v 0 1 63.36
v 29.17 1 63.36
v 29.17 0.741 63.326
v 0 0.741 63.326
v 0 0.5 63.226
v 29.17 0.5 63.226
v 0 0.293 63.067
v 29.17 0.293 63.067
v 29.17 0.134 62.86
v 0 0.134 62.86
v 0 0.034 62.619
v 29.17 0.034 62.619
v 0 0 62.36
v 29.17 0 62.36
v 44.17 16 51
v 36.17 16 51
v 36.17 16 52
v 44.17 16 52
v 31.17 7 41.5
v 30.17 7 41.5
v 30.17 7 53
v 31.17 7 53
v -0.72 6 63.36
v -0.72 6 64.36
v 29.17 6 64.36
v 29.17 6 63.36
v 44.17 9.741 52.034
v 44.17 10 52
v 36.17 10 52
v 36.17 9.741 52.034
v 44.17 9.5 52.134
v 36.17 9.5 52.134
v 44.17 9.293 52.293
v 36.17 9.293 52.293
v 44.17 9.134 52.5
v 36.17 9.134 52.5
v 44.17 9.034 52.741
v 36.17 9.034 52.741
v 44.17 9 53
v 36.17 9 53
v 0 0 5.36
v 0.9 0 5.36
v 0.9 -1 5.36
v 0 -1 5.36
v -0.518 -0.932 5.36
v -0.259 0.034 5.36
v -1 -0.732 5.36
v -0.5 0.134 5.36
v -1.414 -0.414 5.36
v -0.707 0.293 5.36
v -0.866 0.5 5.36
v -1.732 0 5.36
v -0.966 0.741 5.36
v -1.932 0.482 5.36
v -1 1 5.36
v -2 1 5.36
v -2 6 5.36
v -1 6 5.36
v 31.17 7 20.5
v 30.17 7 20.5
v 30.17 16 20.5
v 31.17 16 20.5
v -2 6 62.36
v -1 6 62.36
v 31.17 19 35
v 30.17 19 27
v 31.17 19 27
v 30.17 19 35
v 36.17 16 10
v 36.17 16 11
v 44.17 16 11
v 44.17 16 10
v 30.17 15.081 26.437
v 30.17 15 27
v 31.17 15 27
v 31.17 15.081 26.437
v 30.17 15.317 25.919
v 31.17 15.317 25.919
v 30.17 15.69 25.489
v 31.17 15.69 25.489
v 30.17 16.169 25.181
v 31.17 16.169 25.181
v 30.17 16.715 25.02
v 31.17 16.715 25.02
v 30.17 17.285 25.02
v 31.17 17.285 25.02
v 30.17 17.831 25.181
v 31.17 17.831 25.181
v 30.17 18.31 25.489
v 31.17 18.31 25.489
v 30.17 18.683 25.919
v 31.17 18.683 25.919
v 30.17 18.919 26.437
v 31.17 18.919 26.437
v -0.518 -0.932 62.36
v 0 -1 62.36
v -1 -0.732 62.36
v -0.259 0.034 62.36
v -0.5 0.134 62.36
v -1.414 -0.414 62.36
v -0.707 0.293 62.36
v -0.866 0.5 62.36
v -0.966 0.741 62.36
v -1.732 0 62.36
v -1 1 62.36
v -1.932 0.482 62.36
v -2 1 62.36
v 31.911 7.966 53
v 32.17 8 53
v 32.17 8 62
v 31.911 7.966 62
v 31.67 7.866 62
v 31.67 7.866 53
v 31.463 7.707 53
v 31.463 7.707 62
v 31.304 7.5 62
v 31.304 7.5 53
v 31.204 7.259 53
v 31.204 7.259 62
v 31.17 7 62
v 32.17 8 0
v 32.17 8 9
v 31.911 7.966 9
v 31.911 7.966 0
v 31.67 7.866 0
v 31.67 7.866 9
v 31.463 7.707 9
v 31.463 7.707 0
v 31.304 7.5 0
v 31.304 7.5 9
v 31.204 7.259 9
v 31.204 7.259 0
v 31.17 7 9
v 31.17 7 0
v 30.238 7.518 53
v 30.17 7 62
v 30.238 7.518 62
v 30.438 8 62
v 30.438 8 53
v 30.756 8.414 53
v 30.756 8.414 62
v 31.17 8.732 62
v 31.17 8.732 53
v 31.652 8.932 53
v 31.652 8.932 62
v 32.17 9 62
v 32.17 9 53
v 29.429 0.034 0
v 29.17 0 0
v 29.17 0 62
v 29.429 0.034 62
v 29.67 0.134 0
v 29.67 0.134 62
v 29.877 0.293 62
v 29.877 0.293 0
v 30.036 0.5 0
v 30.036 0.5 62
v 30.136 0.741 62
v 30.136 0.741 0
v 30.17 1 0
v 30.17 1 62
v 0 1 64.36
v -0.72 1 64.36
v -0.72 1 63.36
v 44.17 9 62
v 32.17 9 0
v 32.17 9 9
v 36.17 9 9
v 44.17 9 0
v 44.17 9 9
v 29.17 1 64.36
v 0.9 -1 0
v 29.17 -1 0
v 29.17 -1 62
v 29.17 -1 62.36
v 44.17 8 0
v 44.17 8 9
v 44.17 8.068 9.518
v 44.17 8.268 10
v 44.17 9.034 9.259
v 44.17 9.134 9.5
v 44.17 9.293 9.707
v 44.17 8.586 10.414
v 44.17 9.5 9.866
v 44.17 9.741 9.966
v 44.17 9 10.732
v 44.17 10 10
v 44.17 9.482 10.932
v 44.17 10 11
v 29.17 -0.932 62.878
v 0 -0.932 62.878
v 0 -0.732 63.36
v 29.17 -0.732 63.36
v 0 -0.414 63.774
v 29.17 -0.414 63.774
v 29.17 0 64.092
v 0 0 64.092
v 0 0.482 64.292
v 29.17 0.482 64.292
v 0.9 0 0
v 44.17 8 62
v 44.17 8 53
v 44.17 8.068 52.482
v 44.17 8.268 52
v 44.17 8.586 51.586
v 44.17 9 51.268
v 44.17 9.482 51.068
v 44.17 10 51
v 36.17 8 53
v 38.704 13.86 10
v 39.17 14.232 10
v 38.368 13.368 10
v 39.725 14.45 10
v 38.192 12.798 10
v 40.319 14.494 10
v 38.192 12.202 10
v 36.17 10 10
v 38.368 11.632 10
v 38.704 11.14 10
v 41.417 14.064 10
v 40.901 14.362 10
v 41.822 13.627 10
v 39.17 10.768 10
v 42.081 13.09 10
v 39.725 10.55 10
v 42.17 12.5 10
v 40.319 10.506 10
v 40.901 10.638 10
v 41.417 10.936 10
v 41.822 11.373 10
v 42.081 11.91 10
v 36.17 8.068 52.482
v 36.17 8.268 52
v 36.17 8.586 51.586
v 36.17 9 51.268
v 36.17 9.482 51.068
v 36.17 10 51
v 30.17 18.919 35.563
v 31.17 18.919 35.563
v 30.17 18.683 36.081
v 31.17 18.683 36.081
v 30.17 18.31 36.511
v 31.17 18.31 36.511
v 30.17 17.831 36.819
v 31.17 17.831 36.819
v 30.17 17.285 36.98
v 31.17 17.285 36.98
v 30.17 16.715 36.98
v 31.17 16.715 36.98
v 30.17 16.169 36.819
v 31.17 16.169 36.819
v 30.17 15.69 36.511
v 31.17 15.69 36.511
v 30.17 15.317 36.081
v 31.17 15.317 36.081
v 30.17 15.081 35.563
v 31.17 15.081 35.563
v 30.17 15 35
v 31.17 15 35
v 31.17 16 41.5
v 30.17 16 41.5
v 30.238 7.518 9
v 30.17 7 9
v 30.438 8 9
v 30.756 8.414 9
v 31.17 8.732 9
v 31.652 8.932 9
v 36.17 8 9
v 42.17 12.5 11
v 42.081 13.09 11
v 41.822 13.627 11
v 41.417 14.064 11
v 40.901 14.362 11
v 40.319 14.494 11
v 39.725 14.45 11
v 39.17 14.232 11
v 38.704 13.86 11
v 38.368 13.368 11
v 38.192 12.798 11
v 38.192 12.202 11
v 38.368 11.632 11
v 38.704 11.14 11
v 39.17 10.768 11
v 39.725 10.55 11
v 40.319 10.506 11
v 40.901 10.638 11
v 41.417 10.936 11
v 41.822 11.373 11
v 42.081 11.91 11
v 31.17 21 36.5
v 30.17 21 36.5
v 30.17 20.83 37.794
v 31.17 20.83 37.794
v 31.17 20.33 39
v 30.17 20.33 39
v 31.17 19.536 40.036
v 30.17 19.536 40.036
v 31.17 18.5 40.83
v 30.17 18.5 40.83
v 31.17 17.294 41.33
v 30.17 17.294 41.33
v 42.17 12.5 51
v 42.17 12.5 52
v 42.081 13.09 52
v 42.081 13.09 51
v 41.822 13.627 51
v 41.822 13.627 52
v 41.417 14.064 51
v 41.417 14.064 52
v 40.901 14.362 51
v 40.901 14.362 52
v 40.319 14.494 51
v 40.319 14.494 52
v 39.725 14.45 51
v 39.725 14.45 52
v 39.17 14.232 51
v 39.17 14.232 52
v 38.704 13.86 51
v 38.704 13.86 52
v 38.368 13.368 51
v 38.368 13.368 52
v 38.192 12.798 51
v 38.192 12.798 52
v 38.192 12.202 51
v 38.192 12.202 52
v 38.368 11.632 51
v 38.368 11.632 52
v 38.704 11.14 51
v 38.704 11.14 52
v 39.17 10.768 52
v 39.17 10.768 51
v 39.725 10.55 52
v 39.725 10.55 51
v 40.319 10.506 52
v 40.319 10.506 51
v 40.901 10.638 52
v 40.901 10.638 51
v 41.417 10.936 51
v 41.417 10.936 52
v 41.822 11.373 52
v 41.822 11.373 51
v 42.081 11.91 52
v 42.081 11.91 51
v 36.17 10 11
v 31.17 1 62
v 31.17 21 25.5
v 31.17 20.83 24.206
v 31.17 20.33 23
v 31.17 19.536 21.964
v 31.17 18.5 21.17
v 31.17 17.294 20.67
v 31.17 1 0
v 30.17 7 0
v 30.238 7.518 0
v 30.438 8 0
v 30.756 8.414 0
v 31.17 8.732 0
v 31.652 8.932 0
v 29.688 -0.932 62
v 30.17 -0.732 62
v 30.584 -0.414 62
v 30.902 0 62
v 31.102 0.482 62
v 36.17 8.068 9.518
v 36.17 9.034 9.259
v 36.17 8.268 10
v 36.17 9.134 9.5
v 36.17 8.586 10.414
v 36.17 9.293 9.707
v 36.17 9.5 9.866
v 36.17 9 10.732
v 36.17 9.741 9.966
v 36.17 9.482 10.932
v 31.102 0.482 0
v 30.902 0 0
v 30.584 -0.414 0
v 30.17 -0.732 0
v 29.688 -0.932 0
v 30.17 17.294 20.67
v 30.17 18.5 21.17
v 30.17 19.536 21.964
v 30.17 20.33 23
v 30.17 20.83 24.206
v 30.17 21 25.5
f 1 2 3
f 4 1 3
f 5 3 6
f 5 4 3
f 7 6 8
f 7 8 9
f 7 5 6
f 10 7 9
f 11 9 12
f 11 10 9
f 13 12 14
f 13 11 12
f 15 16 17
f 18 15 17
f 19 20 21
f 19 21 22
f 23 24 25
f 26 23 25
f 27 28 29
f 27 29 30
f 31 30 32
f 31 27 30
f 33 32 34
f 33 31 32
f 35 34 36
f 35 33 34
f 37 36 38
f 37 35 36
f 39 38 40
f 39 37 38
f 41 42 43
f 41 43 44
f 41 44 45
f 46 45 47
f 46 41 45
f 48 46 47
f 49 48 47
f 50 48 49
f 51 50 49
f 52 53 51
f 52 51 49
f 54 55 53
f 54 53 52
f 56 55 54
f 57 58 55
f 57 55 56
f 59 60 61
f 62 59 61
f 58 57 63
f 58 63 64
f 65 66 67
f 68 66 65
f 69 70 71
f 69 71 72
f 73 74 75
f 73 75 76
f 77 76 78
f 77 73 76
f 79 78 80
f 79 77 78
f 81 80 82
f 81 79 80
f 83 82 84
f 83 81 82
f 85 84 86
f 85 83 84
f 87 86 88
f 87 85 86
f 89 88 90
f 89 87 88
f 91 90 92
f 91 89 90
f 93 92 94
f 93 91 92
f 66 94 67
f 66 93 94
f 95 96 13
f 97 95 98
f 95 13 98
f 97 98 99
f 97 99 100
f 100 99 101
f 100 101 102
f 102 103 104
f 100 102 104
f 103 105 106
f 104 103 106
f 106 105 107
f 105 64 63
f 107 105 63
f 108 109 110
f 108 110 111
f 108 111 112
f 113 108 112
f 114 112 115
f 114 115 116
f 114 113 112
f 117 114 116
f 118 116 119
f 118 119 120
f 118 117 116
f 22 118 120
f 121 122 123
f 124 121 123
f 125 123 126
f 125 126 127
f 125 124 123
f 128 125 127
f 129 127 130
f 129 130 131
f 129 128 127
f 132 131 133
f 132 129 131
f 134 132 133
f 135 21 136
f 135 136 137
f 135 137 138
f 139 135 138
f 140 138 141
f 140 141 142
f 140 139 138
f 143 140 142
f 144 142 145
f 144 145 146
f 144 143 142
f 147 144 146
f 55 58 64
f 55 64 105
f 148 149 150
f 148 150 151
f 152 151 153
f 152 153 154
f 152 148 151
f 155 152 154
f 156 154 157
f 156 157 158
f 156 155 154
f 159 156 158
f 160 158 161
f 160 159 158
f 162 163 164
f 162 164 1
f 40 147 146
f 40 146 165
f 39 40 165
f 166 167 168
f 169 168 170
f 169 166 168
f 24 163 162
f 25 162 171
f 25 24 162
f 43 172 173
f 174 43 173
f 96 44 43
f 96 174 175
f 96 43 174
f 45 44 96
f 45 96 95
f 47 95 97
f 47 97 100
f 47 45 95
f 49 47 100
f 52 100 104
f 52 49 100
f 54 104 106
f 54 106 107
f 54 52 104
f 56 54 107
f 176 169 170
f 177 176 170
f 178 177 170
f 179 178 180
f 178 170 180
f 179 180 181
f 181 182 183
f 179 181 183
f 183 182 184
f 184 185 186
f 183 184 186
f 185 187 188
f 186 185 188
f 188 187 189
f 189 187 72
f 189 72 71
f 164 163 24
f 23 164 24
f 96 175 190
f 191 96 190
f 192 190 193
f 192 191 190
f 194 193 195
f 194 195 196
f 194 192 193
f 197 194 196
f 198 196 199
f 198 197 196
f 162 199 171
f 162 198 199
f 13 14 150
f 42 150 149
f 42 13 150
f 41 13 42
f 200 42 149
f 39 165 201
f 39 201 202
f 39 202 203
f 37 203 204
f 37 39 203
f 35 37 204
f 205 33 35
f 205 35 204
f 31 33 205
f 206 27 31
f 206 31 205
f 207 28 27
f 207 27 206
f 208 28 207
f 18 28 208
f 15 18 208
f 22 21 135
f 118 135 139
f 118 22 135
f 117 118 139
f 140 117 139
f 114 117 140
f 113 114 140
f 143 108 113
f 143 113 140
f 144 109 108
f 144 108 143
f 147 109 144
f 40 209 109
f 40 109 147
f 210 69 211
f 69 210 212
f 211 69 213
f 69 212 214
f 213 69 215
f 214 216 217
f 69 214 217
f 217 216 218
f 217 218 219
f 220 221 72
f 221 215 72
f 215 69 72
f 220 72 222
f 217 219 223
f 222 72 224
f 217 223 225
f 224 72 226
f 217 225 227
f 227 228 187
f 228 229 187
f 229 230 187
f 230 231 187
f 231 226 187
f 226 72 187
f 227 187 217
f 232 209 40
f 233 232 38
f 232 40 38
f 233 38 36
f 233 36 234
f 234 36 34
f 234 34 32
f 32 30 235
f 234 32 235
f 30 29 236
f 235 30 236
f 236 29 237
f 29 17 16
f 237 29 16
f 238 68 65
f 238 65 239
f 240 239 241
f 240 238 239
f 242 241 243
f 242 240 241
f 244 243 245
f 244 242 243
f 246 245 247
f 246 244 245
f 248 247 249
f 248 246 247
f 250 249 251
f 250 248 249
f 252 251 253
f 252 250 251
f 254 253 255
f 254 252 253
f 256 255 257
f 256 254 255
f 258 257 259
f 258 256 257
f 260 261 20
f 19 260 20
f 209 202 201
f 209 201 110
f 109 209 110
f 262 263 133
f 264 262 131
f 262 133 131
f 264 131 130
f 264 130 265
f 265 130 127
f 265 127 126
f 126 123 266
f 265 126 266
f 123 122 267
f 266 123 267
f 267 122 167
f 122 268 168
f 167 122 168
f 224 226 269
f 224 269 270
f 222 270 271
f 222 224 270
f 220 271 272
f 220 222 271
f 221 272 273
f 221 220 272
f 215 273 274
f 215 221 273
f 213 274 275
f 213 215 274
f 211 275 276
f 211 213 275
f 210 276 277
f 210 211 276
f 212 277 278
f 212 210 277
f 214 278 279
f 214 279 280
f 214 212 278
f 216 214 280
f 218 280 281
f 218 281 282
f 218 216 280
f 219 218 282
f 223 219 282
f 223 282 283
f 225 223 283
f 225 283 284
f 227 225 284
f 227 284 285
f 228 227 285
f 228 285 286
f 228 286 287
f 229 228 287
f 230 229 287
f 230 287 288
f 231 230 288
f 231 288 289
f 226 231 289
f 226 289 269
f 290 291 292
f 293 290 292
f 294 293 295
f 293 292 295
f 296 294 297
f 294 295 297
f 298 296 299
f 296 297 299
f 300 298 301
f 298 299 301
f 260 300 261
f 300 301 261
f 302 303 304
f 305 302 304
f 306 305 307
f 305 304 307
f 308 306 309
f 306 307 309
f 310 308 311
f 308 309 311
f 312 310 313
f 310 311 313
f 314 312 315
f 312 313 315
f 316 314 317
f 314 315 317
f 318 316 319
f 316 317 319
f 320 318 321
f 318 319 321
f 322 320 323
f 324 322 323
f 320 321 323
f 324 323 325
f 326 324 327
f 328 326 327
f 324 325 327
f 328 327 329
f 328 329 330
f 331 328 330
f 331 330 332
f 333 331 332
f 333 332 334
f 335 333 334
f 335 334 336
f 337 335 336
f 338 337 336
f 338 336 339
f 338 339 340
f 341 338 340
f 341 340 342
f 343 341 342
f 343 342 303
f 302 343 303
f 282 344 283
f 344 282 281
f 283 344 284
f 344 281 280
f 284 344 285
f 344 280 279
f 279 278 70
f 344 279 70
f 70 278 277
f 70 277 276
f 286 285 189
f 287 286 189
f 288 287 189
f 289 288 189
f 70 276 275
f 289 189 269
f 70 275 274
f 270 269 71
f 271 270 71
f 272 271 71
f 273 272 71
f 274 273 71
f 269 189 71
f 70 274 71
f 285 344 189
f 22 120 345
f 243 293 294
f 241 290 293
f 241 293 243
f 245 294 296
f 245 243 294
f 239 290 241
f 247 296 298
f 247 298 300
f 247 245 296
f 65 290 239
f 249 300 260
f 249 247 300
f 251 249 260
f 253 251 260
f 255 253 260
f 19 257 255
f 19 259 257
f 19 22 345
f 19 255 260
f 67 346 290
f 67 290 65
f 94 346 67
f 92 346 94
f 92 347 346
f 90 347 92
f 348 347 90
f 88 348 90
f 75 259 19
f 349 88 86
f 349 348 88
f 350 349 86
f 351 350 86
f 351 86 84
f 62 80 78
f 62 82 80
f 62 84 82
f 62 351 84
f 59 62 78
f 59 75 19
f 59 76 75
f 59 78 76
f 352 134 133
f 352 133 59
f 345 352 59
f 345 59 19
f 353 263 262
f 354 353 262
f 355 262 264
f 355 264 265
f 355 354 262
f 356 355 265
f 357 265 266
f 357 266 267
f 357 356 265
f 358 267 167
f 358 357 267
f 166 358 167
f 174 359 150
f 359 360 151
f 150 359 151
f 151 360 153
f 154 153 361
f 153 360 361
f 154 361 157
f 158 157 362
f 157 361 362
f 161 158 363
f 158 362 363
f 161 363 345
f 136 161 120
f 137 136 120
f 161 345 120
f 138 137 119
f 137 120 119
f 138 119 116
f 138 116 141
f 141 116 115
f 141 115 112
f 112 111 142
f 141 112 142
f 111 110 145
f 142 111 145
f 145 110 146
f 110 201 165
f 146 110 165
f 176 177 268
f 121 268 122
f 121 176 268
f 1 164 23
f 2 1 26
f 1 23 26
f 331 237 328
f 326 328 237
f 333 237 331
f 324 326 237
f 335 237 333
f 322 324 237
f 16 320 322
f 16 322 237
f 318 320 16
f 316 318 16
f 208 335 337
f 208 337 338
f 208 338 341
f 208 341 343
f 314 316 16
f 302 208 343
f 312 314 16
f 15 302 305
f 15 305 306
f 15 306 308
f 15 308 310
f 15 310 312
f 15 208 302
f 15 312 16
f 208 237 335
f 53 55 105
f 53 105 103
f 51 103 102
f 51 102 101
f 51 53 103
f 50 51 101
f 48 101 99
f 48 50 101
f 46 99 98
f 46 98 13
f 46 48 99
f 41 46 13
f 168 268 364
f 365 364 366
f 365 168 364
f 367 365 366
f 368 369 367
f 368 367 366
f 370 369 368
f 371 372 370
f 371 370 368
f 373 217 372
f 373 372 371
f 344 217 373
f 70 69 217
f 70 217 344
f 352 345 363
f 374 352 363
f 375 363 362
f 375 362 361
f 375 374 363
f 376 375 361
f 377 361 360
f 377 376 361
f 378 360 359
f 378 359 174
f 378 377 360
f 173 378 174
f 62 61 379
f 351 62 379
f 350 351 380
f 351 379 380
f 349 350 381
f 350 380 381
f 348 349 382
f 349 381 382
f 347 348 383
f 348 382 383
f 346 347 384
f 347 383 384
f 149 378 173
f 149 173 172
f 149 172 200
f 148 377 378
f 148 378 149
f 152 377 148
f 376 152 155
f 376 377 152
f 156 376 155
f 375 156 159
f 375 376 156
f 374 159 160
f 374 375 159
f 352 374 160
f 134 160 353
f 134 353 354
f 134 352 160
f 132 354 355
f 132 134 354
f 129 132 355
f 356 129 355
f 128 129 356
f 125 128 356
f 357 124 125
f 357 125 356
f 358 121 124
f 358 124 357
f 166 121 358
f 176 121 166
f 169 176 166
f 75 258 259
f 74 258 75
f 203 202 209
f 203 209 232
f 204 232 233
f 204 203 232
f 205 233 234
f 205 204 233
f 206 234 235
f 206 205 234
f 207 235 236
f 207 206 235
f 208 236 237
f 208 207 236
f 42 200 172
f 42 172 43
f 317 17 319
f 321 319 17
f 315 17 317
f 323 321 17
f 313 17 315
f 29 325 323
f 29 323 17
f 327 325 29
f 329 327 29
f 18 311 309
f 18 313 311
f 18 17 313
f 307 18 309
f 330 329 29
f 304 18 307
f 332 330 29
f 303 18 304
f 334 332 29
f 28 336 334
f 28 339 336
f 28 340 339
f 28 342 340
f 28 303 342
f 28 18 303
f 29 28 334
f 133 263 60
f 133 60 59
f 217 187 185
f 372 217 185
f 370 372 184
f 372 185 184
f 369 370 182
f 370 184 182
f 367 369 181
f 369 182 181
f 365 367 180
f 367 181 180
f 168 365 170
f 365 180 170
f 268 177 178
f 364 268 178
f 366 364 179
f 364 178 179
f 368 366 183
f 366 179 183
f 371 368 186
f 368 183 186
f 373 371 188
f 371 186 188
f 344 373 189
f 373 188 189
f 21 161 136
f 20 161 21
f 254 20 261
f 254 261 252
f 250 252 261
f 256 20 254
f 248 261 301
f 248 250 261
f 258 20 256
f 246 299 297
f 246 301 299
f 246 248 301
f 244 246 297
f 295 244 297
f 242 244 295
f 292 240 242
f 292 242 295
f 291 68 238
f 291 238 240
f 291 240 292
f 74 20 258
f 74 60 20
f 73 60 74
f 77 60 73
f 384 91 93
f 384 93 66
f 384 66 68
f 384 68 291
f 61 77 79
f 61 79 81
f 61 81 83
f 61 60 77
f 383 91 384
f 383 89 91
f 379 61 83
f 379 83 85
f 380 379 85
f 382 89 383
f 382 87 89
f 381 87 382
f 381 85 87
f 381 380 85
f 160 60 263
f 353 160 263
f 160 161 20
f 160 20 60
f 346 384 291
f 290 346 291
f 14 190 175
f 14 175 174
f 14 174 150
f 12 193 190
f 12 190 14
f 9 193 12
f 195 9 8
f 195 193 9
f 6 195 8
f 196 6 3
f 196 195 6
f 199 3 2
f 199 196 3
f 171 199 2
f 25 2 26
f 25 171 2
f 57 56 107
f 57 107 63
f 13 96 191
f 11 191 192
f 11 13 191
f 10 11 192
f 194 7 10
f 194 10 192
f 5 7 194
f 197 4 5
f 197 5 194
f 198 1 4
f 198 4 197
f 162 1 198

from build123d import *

# Parameters (mm, degrees)
Z_KLADN_PLECH1_DEPTH     = 62
LEM_Z_HRANY1_DEPTH       = 29.17
LEM_START                = 1
LEM_Z_HRANY1_PROFILE_W   = 29.89
LEM_Z_HRANY1_PROFILE_H   = 5
LEM_Z_HRANY1_FLAT_DEPTH  = 1
LEM_Z_HRANY2_DEPTH       = 57
SKICA12_W                = 5.36
SKICA12_H                = 1
ODEBRAT_VYSUNUT_M1_DEPTH = 0.9
OU_KO2_DEPTH             = 1
LEM_Z_HRANY3_DEPTH       = 9
LEM_Z_HRANY4_DEPTH       = 8
ODEBRAT_VYSUNUT_M2_REACH = 73.386
SKICA25_R                = 2
LEM_Z_HRANY5_DEPTH       = 9


# Sheet-metal steps are written as plain solids
with BuildPart() as part:
    # Skica1 → Základní plech1 (new body)
    with BuildSketch(Plane.XY):
        with BuildLine():
            Line((0, 0), (29.17, 0))
            ThreePointArc((29.17, 0), (29.877106781, 0.292893219), (30.17, 1))
            Line((30.17, 1), (30.17, 7))
            Line((30.17, 7), (31.17, 7))
            Line((31.17, 7), (31.17, 1))
            ThreePointArc((31.17, 1), (30.584213562, -0.414213562), (29.17, -1))
            Line((29.17, -1), (0, -1))
            Line((0, -1), (0, 0))
        make_face()
    extrude(amount=Z_KLADN_PLECH1_DEPTH)

    # Lem z hrany1 bend section (across the edge) → Lem z hrany1 (add)
    with BuildSketch(Plane(origin=(0, 0, 63.36), x_dir=(0, 0, -1), z_dir=(1, 0, 0))):
        with BuildLine():
            Line((-1, 1), (0, 1))
            ThreePointArc((0, 1), (0.292893219, 0.292893219), (1, 0))
            Line((1, 0), (1.36, 0))
            Line((1.36, 0), (1.36, -1))
            Line((1.36, -1), (1, -1))
            ThreePointArc((1, -1), (-0.414213562, -0.414213562), (-1, 1))
        make_face()
    extrude(amount=LEM_Z_HRANY1_DEPTH)

    # Lem z hrany1 profile (on flange) → Lem z hrany1 flat (add)
    with BuildSketch(Plane.XY.offset(63.36).offset(LEM_START)):
        with Locations((14.225, 3.5)):
            Rectangle(LEM_Z_HRANY1_PROFILE_W, LEM_Z_HRANY1_PROFILE_H)
    extrude(amount=-LEM_Z_HRANY1_FLAT_DEPTH)

    # Lem z hrany2 section (across the edge) → Lem z hrany2 (add)
    with BuildSketch(Plane(origin=(-1, 0, 5.36), x_dir=(1, 0, 0), z_dir=(0, 0, 1))):
        with BuildLine():
            Line((-1, 1), (-1, 6))
            Line((-1, 6), (0, 6))
            Line((0, 6), (0, 1))
            ThreePointArc((0, 1), (0.292893219, 0.292893219), (1, 0))
            Line((1, 0), (1, -1))
            ThreePointArc((1, -1), (-0.414213562, -0.414213562), (-1, 1))
        make_face()
    extrude(amount=LEM_Z_HRANY2_DEPTH)

    # Skica12 → Odebrat vysunutím1 (cut)
    with BuildSketch(Plane.ZY):
        with Locations((2.68, -0.5)):
            Rectangle(SKICA12_W, SKICA12_H)
    extrude(amount=-ODEBRAT_VYSUNUT_M1_DEPTH, mode=Mode.SUBTRACT)

    # Skica13 → Ouško2 (add)
    with BuildSketch(Plane.ZY.offset(-30.17)):
        with BuildLine():
            Line((20.5, 7), (20.5, 16))
            ThreePointArc((20.5, 16), (21.964466094, 19.535533906), (25.5, 21))
            Line((25.5, 21), (36.5, 21))
            ThreePointArc((36.5, 21), (40.035533906, 19.535533906), (41.5, 16))
            Line((41.5, 16), (41.5, 7))
            Line((41.5, 7), (20.5, 7))
        make_face()
        with BuildLine():
            Line((27, 19), (35, 19))
            ThreePointArc((35, 19), (37, 17), (35, 15))
            Line((35, 15), (27, 15))
            ThreePointArc((27, 15), (25, 17), (27, 19))
        make_face(mode=Mode.SUBTRACT)
    extrude(amount=-OU_KO2_DEPTH)

    # Lem z hrany3 section (across the edge) → Lem z hrany3 (add)
    with BuildSketch(Plane(origin=(31.17, 8, 53), x_dir=(0, -1, 0), z_dir=(0, 0, 1))):
        with BuildLine():
            Line((-1, 1), (-1, 13))
            Line((-1, 13), (0, 13))
            Line((0, 13), (0, 1))
            ThreePointArc((0, 1), (0.292893219, 0.292893219), (1, 0))
            Line((1, 0), (1, -1))
            ThreePointArc((1, -1), (-0.414213562, -0.414213562), (-1, 1))
        make_face()
    extrude(amount=LEM_Z_HRANY3_DEPTH)

    # Lem z hrany4 section (across the edge) → Lem z hrany4 (add)
    with BuildSketch(Plane(origin=(44.17, 9, 52), x_dir=(0, 0, 1), z_dir=(-1, 0, 0))):
        with BuildLine():
            Line((-1, 1), (-1, 7))
            Line((-1, 7), (0, 7))
            Line((0, 7), (0, 1))
            ThreePointArc((0, 1), (0.292893219, 0.292893219), (1, 0))
            Line((1, 0), (1, -1))
            ThreePointArc((1, -1), (-0.414213562, -0.414213562), (-1, 1))
        make_face()
    lem_z_hrany4 = extrude(amount=LEM_Z_HRANY4_DEPTH)

    # Skica25 → Odebrat vysunutím2 (cut, up to next)
    with BuildSketch(Plane.XY.offset(52), mode=Mode.PRIVATE) as odebrat_vysunut_m2_sk1:
        with Locations((40.17, 12.5)):
            Circle(SKICA25_R)
    odebrat_vysunut_m2_tool1 = extrude(odebrat_vysunut_m2_sk1.sketch, amount=-ODEBRAT_VYSUNUT_M2_REACH, mode=Mode.PRIVATE) & part.part
    odebrat_vysunut_m2 = odebrat_vysunut_m2_tool1.solids().sort_by_distance((40.17, 12.5, 52))[0]
    add(odebrat_vysunut_m2, mode=Mode.SUBTRACT)

    # Lem z hrany5 section (across the edge) → Lem z hrany5 (add)
    with BuildSketch(Plane(origin=(31.17, 8, 0), x_dir=(0, -1, 0), z_dir=(0, 0, 1))):
        with BuildLine():
            Line((-1, 1), (-1, 13))
            Line((-1, 13), (0, 13))
            Line((0, 13), (0, 1))
            ThreePointArc((0, 1), (0.292893219, 0.292893219), (1, 0))
            Line((1, 0), (1, -1))
            ThreePointArc((1, -1), (-0.414213562, -0.414213562), (-1, 1))
        make_face()
    extrude(amount=LEM_Z_HRANY5_DEPTH)

    # Zrcadlit1: Lem z hrany4, Odebrat vysunutím2 across plane
    add(lem_z_hrany4.mirror(Plane.XY.offset(31)))
    add(odebrat_vysunut_m2.mirror(Plane.XY.offset(31)), mode=Mode.SUBTRACT)


solid = part.part
